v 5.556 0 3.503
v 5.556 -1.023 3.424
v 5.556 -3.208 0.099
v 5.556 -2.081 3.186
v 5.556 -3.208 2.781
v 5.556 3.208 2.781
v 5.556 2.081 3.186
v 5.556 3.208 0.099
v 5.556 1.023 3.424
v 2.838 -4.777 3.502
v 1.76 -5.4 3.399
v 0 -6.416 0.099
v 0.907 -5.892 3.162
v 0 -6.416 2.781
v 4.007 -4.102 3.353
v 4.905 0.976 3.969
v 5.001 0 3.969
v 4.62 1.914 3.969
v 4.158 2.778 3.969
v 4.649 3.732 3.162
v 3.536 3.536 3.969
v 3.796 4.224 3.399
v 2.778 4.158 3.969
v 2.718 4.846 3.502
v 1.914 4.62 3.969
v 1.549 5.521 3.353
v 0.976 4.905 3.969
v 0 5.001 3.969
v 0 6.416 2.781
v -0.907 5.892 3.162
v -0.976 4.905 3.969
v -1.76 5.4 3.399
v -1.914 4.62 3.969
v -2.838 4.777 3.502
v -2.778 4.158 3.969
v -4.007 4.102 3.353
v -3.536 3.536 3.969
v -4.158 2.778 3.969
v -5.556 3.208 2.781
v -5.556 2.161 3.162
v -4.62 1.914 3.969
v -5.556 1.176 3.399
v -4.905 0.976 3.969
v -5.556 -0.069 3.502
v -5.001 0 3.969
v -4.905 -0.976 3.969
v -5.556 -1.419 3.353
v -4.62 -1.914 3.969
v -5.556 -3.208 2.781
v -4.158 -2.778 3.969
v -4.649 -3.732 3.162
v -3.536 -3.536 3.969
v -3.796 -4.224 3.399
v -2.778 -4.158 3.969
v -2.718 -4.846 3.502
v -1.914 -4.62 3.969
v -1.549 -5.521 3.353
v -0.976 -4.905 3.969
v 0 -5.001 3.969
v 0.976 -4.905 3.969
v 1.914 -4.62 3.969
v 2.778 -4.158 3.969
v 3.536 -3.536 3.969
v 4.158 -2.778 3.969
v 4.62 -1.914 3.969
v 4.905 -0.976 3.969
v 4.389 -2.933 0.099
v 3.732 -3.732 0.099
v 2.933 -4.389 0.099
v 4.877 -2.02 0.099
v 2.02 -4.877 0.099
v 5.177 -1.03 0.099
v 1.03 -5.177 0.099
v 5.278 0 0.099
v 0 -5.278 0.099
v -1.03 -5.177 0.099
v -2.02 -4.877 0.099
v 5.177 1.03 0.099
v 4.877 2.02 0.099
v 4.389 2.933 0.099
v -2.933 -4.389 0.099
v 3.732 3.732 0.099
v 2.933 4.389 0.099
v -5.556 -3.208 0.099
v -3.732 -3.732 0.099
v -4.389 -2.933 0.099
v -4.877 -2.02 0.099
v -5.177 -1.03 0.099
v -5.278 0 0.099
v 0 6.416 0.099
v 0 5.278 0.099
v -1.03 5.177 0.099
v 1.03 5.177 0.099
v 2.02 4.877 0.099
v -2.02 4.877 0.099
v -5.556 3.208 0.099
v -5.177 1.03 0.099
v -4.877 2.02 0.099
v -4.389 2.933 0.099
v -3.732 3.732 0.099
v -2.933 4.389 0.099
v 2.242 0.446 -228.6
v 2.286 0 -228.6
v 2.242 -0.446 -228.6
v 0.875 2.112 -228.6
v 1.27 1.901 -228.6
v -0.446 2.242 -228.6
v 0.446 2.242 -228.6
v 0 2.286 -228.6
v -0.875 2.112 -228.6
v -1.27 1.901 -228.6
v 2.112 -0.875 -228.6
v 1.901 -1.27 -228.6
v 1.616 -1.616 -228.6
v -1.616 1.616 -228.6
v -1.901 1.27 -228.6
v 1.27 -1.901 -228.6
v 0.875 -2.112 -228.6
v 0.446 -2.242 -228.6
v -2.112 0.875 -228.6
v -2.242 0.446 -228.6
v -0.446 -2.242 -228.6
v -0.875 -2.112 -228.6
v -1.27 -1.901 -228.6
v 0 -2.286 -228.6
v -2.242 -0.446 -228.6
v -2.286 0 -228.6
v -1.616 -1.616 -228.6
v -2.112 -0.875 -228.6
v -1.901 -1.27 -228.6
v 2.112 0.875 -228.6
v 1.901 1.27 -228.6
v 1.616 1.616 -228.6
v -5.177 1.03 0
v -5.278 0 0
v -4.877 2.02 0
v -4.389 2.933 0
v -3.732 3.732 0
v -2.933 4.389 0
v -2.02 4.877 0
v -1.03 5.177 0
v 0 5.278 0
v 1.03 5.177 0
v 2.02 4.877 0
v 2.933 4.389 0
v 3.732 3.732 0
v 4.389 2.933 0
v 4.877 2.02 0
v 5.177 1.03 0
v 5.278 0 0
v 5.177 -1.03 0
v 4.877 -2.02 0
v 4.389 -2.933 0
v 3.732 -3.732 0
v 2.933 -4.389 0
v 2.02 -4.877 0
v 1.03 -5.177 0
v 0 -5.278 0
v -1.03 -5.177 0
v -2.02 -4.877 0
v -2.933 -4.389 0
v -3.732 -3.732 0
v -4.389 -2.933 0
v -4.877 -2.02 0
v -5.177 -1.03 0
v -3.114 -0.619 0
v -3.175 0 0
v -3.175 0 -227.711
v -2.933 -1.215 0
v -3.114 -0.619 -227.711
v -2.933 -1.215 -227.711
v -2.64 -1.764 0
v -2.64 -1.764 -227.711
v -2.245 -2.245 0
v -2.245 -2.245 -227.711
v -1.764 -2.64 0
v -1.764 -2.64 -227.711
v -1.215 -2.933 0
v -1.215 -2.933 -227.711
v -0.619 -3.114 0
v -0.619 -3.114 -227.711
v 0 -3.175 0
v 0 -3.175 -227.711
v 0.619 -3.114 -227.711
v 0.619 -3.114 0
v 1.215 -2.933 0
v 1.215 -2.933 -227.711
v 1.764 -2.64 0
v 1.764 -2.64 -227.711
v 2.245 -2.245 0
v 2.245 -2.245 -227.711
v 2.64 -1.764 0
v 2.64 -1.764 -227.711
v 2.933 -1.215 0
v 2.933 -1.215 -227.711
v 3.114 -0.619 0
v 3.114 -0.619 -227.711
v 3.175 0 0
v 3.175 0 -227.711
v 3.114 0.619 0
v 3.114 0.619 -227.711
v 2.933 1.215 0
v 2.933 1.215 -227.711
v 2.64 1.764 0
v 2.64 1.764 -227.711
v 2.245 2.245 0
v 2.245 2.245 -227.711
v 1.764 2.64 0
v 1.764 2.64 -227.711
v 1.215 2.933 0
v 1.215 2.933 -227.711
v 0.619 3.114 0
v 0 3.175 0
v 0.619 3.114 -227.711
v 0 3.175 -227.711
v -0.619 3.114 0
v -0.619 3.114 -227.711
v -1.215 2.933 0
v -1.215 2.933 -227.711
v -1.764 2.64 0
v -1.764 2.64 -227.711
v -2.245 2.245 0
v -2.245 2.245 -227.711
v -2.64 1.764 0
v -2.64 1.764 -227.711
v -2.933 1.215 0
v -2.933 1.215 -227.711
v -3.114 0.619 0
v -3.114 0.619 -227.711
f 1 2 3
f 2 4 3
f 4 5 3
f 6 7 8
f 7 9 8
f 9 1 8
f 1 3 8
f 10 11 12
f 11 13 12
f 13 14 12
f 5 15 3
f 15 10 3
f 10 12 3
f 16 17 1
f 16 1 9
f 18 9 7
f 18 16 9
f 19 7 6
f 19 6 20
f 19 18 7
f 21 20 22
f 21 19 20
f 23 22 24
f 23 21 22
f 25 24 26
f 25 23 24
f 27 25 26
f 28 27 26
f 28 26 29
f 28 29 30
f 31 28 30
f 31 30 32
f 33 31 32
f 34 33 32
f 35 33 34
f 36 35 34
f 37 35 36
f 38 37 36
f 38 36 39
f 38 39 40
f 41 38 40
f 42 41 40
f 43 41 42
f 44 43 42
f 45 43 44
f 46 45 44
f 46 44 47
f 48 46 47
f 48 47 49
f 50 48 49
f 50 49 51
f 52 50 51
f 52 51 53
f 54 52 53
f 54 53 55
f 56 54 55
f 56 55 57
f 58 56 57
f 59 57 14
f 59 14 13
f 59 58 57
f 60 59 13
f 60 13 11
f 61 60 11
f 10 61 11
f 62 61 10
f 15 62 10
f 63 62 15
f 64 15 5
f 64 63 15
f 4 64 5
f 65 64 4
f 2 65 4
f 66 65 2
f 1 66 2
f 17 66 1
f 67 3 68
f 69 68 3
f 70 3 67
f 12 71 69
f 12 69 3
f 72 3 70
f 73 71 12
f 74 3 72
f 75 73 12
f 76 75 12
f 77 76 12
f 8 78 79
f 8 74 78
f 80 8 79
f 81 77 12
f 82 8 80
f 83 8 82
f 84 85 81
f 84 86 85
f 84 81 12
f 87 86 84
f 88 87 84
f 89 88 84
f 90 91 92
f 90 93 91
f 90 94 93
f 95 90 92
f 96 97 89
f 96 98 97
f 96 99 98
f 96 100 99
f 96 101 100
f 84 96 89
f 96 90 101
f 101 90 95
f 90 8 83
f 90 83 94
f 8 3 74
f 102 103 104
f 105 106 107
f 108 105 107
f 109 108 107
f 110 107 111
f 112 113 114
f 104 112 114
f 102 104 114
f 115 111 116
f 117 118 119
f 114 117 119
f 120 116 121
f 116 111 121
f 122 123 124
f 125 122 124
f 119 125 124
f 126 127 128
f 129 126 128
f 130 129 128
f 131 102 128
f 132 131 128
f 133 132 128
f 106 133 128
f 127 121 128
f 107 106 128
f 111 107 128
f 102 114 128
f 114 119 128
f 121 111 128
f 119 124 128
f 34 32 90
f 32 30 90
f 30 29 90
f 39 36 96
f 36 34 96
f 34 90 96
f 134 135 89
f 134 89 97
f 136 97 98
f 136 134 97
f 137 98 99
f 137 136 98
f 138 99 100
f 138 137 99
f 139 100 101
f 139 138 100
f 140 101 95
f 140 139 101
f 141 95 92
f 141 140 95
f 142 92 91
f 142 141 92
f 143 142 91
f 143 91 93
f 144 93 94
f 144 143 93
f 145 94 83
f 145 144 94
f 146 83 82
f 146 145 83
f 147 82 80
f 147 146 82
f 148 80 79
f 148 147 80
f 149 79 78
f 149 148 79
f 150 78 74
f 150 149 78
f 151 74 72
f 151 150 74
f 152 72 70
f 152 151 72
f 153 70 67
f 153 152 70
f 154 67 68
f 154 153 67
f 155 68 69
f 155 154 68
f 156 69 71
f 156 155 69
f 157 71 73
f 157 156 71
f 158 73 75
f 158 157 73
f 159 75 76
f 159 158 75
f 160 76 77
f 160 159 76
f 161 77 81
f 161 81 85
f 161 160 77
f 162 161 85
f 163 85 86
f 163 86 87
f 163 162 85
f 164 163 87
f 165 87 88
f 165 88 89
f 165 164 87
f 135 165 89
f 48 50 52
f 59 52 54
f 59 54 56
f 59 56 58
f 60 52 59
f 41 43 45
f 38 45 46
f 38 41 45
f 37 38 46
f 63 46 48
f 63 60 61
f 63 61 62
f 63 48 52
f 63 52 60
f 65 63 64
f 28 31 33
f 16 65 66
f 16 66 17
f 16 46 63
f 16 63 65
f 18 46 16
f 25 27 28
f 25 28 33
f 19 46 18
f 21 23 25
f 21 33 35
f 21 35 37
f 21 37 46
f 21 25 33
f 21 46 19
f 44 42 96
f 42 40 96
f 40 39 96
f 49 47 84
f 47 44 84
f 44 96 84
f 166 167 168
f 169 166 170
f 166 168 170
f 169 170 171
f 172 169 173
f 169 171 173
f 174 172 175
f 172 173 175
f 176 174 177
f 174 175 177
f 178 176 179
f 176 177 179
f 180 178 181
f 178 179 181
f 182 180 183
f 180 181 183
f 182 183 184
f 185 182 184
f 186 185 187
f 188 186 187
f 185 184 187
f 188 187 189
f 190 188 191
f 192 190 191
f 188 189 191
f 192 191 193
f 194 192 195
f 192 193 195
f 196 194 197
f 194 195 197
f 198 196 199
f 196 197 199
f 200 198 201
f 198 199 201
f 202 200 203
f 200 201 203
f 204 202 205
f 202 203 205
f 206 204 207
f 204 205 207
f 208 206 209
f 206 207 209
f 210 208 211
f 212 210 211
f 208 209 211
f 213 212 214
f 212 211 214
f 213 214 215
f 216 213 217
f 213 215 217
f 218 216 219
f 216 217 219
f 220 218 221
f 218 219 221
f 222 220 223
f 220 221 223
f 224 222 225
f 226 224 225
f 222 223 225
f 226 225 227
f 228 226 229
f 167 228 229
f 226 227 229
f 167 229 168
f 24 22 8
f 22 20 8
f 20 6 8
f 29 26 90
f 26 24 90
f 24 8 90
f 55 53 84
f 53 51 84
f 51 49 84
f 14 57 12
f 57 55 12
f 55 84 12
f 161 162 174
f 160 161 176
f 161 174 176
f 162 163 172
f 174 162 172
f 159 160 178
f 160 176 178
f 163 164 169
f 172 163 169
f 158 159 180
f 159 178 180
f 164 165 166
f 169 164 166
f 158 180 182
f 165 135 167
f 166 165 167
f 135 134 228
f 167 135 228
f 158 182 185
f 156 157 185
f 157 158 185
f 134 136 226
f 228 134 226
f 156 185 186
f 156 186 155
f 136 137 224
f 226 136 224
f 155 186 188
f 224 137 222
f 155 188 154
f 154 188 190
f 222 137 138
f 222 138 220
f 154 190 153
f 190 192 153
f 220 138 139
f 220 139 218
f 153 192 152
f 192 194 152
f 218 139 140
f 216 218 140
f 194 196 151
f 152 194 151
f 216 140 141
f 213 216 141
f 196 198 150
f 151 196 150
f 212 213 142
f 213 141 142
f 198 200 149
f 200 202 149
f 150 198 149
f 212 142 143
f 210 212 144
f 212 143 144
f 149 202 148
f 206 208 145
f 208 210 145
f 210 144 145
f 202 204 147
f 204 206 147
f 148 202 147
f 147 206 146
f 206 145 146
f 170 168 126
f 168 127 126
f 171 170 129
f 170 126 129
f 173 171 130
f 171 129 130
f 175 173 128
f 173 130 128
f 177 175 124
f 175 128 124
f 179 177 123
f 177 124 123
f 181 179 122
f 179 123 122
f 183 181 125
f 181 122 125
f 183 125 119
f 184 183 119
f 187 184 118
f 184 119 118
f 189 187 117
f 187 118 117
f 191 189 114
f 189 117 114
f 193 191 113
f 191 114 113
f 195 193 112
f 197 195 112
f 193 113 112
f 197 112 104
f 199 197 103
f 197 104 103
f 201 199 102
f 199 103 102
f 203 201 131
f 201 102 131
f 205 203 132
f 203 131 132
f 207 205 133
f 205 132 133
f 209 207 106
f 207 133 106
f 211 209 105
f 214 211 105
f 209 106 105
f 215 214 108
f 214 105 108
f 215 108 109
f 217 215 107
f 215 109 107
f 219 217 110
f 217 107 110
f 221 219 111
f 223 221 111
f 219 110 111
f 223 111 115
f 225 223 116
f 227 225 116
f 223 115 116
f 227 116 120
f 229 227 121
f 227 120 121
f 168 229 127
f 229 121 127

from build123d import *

# Parameters (mm, degrees)
BOSS_EXTRUDE1_DEPTH = 3.96875
SKETCH4_OUTSIDE_W   = 616.832
SKETCH4_OUTSIDE_H   = 618.552
SKETCH4_OUTSIDE_R   = 5.000625
CUT_EXTRUDE1_DEPTH  = 233.723565508
CUT_EXTRUDE1_DRAFT  = -50
SKETCH9_R           = 6.415804866
SKETCH9_R_2         = 5.2784375
CUT_EXTRUDE2_DEPTH  = 0.09921875


with BuildPart() as part:
    # Sketch2 → Revolve1 (revolve)
    with BuildSketch(Plane(origin=(0, 0, 0), x_dir=(0, 0, -1), z_dir=(1, 0, 0)), mode=Mode.PRIVATE) as revolve1_sk:
        Polygon((228.6, 0), (0, 0), (0, 3.175), (227.711, 3.175), (228.6, 2.286), align=None)
    revolve(revolve1_sk.sketch.rotate(Axis((0, 0, -228.6), (0, 0, 1)), 90), axis=Axis((0, 0, -228.6), (0, 0, 1)))

    # Sketch3 → Boss-Extrude1 (add)
    with BuildSketch(Plane.XY):
        Polygon((0, 6.415804866), (-5.55625, 3.207902433), (-5.55625, -3.207902433), (0, -6.415804866), (5.55625, -3.207902433), (5.55625, 3.207902433), align=None)
    extrude(amount=BOSS_EXTRUDE1_DEPTH)


with BuildPart() as cut_extrude1_tool:
    # Sketch4 outside → Cut-Extrude1 (with draft: the straight prism first)
    with BuildSketch(Plane.XY.offset(3.96875)):
        Rectangle(SKETCH4_OUTSIDE_W, SKETCH4_OUTSIDE_H)
        Circle(SKETCH4_OUTSIDE_R, mode=Mode.SUBTRACT)
    extrude(amount=-CUT_EXTRUDE1_DEPTH)
    # Cut-Extrude1: the draft: its side faces are tilted about the plane it starts from
    cut_extrude1_sides = [cut_extrude1_tool.faces().sort_by_distance(p)[0] for p in [
        (0, -309.276, -112.893032754),
        (308.416, 0, -112.893032754),
        (0, 309.276, -112.893032754),
        (-308.416, 0, -112.893032754),
        (-5.000625, 0, -112.893032754),
    ]]
    draft(cut_extrude1_sides, Plane.XY.offset(3.96875), CUT_EXTRUDE1_DRAFT)


with BuildPart() as part_1:
    add(part.part)

    # Cut-Extrude1: cut by cut_extrude1_tool
    add(cut_extrude1_tool.part, mode=Mode.SUBTRACT)

    # Sketch9 → Cut-Extrude2 (cut)
    with BuildSketch(Plane(origin=(0, 0, 0), x_dir=(-1, 0, 0), z_dir=(0, 0, -1))):
        Circle(SKETCH9_R)
        Circle(SKETCH9_R_2, mode=Mode.SUBTRACT)
    extrude(amount=-CUT_EXTRUDE2_DEPTH, mode=Mode.SUBTRACT)


solid = part_1.part
